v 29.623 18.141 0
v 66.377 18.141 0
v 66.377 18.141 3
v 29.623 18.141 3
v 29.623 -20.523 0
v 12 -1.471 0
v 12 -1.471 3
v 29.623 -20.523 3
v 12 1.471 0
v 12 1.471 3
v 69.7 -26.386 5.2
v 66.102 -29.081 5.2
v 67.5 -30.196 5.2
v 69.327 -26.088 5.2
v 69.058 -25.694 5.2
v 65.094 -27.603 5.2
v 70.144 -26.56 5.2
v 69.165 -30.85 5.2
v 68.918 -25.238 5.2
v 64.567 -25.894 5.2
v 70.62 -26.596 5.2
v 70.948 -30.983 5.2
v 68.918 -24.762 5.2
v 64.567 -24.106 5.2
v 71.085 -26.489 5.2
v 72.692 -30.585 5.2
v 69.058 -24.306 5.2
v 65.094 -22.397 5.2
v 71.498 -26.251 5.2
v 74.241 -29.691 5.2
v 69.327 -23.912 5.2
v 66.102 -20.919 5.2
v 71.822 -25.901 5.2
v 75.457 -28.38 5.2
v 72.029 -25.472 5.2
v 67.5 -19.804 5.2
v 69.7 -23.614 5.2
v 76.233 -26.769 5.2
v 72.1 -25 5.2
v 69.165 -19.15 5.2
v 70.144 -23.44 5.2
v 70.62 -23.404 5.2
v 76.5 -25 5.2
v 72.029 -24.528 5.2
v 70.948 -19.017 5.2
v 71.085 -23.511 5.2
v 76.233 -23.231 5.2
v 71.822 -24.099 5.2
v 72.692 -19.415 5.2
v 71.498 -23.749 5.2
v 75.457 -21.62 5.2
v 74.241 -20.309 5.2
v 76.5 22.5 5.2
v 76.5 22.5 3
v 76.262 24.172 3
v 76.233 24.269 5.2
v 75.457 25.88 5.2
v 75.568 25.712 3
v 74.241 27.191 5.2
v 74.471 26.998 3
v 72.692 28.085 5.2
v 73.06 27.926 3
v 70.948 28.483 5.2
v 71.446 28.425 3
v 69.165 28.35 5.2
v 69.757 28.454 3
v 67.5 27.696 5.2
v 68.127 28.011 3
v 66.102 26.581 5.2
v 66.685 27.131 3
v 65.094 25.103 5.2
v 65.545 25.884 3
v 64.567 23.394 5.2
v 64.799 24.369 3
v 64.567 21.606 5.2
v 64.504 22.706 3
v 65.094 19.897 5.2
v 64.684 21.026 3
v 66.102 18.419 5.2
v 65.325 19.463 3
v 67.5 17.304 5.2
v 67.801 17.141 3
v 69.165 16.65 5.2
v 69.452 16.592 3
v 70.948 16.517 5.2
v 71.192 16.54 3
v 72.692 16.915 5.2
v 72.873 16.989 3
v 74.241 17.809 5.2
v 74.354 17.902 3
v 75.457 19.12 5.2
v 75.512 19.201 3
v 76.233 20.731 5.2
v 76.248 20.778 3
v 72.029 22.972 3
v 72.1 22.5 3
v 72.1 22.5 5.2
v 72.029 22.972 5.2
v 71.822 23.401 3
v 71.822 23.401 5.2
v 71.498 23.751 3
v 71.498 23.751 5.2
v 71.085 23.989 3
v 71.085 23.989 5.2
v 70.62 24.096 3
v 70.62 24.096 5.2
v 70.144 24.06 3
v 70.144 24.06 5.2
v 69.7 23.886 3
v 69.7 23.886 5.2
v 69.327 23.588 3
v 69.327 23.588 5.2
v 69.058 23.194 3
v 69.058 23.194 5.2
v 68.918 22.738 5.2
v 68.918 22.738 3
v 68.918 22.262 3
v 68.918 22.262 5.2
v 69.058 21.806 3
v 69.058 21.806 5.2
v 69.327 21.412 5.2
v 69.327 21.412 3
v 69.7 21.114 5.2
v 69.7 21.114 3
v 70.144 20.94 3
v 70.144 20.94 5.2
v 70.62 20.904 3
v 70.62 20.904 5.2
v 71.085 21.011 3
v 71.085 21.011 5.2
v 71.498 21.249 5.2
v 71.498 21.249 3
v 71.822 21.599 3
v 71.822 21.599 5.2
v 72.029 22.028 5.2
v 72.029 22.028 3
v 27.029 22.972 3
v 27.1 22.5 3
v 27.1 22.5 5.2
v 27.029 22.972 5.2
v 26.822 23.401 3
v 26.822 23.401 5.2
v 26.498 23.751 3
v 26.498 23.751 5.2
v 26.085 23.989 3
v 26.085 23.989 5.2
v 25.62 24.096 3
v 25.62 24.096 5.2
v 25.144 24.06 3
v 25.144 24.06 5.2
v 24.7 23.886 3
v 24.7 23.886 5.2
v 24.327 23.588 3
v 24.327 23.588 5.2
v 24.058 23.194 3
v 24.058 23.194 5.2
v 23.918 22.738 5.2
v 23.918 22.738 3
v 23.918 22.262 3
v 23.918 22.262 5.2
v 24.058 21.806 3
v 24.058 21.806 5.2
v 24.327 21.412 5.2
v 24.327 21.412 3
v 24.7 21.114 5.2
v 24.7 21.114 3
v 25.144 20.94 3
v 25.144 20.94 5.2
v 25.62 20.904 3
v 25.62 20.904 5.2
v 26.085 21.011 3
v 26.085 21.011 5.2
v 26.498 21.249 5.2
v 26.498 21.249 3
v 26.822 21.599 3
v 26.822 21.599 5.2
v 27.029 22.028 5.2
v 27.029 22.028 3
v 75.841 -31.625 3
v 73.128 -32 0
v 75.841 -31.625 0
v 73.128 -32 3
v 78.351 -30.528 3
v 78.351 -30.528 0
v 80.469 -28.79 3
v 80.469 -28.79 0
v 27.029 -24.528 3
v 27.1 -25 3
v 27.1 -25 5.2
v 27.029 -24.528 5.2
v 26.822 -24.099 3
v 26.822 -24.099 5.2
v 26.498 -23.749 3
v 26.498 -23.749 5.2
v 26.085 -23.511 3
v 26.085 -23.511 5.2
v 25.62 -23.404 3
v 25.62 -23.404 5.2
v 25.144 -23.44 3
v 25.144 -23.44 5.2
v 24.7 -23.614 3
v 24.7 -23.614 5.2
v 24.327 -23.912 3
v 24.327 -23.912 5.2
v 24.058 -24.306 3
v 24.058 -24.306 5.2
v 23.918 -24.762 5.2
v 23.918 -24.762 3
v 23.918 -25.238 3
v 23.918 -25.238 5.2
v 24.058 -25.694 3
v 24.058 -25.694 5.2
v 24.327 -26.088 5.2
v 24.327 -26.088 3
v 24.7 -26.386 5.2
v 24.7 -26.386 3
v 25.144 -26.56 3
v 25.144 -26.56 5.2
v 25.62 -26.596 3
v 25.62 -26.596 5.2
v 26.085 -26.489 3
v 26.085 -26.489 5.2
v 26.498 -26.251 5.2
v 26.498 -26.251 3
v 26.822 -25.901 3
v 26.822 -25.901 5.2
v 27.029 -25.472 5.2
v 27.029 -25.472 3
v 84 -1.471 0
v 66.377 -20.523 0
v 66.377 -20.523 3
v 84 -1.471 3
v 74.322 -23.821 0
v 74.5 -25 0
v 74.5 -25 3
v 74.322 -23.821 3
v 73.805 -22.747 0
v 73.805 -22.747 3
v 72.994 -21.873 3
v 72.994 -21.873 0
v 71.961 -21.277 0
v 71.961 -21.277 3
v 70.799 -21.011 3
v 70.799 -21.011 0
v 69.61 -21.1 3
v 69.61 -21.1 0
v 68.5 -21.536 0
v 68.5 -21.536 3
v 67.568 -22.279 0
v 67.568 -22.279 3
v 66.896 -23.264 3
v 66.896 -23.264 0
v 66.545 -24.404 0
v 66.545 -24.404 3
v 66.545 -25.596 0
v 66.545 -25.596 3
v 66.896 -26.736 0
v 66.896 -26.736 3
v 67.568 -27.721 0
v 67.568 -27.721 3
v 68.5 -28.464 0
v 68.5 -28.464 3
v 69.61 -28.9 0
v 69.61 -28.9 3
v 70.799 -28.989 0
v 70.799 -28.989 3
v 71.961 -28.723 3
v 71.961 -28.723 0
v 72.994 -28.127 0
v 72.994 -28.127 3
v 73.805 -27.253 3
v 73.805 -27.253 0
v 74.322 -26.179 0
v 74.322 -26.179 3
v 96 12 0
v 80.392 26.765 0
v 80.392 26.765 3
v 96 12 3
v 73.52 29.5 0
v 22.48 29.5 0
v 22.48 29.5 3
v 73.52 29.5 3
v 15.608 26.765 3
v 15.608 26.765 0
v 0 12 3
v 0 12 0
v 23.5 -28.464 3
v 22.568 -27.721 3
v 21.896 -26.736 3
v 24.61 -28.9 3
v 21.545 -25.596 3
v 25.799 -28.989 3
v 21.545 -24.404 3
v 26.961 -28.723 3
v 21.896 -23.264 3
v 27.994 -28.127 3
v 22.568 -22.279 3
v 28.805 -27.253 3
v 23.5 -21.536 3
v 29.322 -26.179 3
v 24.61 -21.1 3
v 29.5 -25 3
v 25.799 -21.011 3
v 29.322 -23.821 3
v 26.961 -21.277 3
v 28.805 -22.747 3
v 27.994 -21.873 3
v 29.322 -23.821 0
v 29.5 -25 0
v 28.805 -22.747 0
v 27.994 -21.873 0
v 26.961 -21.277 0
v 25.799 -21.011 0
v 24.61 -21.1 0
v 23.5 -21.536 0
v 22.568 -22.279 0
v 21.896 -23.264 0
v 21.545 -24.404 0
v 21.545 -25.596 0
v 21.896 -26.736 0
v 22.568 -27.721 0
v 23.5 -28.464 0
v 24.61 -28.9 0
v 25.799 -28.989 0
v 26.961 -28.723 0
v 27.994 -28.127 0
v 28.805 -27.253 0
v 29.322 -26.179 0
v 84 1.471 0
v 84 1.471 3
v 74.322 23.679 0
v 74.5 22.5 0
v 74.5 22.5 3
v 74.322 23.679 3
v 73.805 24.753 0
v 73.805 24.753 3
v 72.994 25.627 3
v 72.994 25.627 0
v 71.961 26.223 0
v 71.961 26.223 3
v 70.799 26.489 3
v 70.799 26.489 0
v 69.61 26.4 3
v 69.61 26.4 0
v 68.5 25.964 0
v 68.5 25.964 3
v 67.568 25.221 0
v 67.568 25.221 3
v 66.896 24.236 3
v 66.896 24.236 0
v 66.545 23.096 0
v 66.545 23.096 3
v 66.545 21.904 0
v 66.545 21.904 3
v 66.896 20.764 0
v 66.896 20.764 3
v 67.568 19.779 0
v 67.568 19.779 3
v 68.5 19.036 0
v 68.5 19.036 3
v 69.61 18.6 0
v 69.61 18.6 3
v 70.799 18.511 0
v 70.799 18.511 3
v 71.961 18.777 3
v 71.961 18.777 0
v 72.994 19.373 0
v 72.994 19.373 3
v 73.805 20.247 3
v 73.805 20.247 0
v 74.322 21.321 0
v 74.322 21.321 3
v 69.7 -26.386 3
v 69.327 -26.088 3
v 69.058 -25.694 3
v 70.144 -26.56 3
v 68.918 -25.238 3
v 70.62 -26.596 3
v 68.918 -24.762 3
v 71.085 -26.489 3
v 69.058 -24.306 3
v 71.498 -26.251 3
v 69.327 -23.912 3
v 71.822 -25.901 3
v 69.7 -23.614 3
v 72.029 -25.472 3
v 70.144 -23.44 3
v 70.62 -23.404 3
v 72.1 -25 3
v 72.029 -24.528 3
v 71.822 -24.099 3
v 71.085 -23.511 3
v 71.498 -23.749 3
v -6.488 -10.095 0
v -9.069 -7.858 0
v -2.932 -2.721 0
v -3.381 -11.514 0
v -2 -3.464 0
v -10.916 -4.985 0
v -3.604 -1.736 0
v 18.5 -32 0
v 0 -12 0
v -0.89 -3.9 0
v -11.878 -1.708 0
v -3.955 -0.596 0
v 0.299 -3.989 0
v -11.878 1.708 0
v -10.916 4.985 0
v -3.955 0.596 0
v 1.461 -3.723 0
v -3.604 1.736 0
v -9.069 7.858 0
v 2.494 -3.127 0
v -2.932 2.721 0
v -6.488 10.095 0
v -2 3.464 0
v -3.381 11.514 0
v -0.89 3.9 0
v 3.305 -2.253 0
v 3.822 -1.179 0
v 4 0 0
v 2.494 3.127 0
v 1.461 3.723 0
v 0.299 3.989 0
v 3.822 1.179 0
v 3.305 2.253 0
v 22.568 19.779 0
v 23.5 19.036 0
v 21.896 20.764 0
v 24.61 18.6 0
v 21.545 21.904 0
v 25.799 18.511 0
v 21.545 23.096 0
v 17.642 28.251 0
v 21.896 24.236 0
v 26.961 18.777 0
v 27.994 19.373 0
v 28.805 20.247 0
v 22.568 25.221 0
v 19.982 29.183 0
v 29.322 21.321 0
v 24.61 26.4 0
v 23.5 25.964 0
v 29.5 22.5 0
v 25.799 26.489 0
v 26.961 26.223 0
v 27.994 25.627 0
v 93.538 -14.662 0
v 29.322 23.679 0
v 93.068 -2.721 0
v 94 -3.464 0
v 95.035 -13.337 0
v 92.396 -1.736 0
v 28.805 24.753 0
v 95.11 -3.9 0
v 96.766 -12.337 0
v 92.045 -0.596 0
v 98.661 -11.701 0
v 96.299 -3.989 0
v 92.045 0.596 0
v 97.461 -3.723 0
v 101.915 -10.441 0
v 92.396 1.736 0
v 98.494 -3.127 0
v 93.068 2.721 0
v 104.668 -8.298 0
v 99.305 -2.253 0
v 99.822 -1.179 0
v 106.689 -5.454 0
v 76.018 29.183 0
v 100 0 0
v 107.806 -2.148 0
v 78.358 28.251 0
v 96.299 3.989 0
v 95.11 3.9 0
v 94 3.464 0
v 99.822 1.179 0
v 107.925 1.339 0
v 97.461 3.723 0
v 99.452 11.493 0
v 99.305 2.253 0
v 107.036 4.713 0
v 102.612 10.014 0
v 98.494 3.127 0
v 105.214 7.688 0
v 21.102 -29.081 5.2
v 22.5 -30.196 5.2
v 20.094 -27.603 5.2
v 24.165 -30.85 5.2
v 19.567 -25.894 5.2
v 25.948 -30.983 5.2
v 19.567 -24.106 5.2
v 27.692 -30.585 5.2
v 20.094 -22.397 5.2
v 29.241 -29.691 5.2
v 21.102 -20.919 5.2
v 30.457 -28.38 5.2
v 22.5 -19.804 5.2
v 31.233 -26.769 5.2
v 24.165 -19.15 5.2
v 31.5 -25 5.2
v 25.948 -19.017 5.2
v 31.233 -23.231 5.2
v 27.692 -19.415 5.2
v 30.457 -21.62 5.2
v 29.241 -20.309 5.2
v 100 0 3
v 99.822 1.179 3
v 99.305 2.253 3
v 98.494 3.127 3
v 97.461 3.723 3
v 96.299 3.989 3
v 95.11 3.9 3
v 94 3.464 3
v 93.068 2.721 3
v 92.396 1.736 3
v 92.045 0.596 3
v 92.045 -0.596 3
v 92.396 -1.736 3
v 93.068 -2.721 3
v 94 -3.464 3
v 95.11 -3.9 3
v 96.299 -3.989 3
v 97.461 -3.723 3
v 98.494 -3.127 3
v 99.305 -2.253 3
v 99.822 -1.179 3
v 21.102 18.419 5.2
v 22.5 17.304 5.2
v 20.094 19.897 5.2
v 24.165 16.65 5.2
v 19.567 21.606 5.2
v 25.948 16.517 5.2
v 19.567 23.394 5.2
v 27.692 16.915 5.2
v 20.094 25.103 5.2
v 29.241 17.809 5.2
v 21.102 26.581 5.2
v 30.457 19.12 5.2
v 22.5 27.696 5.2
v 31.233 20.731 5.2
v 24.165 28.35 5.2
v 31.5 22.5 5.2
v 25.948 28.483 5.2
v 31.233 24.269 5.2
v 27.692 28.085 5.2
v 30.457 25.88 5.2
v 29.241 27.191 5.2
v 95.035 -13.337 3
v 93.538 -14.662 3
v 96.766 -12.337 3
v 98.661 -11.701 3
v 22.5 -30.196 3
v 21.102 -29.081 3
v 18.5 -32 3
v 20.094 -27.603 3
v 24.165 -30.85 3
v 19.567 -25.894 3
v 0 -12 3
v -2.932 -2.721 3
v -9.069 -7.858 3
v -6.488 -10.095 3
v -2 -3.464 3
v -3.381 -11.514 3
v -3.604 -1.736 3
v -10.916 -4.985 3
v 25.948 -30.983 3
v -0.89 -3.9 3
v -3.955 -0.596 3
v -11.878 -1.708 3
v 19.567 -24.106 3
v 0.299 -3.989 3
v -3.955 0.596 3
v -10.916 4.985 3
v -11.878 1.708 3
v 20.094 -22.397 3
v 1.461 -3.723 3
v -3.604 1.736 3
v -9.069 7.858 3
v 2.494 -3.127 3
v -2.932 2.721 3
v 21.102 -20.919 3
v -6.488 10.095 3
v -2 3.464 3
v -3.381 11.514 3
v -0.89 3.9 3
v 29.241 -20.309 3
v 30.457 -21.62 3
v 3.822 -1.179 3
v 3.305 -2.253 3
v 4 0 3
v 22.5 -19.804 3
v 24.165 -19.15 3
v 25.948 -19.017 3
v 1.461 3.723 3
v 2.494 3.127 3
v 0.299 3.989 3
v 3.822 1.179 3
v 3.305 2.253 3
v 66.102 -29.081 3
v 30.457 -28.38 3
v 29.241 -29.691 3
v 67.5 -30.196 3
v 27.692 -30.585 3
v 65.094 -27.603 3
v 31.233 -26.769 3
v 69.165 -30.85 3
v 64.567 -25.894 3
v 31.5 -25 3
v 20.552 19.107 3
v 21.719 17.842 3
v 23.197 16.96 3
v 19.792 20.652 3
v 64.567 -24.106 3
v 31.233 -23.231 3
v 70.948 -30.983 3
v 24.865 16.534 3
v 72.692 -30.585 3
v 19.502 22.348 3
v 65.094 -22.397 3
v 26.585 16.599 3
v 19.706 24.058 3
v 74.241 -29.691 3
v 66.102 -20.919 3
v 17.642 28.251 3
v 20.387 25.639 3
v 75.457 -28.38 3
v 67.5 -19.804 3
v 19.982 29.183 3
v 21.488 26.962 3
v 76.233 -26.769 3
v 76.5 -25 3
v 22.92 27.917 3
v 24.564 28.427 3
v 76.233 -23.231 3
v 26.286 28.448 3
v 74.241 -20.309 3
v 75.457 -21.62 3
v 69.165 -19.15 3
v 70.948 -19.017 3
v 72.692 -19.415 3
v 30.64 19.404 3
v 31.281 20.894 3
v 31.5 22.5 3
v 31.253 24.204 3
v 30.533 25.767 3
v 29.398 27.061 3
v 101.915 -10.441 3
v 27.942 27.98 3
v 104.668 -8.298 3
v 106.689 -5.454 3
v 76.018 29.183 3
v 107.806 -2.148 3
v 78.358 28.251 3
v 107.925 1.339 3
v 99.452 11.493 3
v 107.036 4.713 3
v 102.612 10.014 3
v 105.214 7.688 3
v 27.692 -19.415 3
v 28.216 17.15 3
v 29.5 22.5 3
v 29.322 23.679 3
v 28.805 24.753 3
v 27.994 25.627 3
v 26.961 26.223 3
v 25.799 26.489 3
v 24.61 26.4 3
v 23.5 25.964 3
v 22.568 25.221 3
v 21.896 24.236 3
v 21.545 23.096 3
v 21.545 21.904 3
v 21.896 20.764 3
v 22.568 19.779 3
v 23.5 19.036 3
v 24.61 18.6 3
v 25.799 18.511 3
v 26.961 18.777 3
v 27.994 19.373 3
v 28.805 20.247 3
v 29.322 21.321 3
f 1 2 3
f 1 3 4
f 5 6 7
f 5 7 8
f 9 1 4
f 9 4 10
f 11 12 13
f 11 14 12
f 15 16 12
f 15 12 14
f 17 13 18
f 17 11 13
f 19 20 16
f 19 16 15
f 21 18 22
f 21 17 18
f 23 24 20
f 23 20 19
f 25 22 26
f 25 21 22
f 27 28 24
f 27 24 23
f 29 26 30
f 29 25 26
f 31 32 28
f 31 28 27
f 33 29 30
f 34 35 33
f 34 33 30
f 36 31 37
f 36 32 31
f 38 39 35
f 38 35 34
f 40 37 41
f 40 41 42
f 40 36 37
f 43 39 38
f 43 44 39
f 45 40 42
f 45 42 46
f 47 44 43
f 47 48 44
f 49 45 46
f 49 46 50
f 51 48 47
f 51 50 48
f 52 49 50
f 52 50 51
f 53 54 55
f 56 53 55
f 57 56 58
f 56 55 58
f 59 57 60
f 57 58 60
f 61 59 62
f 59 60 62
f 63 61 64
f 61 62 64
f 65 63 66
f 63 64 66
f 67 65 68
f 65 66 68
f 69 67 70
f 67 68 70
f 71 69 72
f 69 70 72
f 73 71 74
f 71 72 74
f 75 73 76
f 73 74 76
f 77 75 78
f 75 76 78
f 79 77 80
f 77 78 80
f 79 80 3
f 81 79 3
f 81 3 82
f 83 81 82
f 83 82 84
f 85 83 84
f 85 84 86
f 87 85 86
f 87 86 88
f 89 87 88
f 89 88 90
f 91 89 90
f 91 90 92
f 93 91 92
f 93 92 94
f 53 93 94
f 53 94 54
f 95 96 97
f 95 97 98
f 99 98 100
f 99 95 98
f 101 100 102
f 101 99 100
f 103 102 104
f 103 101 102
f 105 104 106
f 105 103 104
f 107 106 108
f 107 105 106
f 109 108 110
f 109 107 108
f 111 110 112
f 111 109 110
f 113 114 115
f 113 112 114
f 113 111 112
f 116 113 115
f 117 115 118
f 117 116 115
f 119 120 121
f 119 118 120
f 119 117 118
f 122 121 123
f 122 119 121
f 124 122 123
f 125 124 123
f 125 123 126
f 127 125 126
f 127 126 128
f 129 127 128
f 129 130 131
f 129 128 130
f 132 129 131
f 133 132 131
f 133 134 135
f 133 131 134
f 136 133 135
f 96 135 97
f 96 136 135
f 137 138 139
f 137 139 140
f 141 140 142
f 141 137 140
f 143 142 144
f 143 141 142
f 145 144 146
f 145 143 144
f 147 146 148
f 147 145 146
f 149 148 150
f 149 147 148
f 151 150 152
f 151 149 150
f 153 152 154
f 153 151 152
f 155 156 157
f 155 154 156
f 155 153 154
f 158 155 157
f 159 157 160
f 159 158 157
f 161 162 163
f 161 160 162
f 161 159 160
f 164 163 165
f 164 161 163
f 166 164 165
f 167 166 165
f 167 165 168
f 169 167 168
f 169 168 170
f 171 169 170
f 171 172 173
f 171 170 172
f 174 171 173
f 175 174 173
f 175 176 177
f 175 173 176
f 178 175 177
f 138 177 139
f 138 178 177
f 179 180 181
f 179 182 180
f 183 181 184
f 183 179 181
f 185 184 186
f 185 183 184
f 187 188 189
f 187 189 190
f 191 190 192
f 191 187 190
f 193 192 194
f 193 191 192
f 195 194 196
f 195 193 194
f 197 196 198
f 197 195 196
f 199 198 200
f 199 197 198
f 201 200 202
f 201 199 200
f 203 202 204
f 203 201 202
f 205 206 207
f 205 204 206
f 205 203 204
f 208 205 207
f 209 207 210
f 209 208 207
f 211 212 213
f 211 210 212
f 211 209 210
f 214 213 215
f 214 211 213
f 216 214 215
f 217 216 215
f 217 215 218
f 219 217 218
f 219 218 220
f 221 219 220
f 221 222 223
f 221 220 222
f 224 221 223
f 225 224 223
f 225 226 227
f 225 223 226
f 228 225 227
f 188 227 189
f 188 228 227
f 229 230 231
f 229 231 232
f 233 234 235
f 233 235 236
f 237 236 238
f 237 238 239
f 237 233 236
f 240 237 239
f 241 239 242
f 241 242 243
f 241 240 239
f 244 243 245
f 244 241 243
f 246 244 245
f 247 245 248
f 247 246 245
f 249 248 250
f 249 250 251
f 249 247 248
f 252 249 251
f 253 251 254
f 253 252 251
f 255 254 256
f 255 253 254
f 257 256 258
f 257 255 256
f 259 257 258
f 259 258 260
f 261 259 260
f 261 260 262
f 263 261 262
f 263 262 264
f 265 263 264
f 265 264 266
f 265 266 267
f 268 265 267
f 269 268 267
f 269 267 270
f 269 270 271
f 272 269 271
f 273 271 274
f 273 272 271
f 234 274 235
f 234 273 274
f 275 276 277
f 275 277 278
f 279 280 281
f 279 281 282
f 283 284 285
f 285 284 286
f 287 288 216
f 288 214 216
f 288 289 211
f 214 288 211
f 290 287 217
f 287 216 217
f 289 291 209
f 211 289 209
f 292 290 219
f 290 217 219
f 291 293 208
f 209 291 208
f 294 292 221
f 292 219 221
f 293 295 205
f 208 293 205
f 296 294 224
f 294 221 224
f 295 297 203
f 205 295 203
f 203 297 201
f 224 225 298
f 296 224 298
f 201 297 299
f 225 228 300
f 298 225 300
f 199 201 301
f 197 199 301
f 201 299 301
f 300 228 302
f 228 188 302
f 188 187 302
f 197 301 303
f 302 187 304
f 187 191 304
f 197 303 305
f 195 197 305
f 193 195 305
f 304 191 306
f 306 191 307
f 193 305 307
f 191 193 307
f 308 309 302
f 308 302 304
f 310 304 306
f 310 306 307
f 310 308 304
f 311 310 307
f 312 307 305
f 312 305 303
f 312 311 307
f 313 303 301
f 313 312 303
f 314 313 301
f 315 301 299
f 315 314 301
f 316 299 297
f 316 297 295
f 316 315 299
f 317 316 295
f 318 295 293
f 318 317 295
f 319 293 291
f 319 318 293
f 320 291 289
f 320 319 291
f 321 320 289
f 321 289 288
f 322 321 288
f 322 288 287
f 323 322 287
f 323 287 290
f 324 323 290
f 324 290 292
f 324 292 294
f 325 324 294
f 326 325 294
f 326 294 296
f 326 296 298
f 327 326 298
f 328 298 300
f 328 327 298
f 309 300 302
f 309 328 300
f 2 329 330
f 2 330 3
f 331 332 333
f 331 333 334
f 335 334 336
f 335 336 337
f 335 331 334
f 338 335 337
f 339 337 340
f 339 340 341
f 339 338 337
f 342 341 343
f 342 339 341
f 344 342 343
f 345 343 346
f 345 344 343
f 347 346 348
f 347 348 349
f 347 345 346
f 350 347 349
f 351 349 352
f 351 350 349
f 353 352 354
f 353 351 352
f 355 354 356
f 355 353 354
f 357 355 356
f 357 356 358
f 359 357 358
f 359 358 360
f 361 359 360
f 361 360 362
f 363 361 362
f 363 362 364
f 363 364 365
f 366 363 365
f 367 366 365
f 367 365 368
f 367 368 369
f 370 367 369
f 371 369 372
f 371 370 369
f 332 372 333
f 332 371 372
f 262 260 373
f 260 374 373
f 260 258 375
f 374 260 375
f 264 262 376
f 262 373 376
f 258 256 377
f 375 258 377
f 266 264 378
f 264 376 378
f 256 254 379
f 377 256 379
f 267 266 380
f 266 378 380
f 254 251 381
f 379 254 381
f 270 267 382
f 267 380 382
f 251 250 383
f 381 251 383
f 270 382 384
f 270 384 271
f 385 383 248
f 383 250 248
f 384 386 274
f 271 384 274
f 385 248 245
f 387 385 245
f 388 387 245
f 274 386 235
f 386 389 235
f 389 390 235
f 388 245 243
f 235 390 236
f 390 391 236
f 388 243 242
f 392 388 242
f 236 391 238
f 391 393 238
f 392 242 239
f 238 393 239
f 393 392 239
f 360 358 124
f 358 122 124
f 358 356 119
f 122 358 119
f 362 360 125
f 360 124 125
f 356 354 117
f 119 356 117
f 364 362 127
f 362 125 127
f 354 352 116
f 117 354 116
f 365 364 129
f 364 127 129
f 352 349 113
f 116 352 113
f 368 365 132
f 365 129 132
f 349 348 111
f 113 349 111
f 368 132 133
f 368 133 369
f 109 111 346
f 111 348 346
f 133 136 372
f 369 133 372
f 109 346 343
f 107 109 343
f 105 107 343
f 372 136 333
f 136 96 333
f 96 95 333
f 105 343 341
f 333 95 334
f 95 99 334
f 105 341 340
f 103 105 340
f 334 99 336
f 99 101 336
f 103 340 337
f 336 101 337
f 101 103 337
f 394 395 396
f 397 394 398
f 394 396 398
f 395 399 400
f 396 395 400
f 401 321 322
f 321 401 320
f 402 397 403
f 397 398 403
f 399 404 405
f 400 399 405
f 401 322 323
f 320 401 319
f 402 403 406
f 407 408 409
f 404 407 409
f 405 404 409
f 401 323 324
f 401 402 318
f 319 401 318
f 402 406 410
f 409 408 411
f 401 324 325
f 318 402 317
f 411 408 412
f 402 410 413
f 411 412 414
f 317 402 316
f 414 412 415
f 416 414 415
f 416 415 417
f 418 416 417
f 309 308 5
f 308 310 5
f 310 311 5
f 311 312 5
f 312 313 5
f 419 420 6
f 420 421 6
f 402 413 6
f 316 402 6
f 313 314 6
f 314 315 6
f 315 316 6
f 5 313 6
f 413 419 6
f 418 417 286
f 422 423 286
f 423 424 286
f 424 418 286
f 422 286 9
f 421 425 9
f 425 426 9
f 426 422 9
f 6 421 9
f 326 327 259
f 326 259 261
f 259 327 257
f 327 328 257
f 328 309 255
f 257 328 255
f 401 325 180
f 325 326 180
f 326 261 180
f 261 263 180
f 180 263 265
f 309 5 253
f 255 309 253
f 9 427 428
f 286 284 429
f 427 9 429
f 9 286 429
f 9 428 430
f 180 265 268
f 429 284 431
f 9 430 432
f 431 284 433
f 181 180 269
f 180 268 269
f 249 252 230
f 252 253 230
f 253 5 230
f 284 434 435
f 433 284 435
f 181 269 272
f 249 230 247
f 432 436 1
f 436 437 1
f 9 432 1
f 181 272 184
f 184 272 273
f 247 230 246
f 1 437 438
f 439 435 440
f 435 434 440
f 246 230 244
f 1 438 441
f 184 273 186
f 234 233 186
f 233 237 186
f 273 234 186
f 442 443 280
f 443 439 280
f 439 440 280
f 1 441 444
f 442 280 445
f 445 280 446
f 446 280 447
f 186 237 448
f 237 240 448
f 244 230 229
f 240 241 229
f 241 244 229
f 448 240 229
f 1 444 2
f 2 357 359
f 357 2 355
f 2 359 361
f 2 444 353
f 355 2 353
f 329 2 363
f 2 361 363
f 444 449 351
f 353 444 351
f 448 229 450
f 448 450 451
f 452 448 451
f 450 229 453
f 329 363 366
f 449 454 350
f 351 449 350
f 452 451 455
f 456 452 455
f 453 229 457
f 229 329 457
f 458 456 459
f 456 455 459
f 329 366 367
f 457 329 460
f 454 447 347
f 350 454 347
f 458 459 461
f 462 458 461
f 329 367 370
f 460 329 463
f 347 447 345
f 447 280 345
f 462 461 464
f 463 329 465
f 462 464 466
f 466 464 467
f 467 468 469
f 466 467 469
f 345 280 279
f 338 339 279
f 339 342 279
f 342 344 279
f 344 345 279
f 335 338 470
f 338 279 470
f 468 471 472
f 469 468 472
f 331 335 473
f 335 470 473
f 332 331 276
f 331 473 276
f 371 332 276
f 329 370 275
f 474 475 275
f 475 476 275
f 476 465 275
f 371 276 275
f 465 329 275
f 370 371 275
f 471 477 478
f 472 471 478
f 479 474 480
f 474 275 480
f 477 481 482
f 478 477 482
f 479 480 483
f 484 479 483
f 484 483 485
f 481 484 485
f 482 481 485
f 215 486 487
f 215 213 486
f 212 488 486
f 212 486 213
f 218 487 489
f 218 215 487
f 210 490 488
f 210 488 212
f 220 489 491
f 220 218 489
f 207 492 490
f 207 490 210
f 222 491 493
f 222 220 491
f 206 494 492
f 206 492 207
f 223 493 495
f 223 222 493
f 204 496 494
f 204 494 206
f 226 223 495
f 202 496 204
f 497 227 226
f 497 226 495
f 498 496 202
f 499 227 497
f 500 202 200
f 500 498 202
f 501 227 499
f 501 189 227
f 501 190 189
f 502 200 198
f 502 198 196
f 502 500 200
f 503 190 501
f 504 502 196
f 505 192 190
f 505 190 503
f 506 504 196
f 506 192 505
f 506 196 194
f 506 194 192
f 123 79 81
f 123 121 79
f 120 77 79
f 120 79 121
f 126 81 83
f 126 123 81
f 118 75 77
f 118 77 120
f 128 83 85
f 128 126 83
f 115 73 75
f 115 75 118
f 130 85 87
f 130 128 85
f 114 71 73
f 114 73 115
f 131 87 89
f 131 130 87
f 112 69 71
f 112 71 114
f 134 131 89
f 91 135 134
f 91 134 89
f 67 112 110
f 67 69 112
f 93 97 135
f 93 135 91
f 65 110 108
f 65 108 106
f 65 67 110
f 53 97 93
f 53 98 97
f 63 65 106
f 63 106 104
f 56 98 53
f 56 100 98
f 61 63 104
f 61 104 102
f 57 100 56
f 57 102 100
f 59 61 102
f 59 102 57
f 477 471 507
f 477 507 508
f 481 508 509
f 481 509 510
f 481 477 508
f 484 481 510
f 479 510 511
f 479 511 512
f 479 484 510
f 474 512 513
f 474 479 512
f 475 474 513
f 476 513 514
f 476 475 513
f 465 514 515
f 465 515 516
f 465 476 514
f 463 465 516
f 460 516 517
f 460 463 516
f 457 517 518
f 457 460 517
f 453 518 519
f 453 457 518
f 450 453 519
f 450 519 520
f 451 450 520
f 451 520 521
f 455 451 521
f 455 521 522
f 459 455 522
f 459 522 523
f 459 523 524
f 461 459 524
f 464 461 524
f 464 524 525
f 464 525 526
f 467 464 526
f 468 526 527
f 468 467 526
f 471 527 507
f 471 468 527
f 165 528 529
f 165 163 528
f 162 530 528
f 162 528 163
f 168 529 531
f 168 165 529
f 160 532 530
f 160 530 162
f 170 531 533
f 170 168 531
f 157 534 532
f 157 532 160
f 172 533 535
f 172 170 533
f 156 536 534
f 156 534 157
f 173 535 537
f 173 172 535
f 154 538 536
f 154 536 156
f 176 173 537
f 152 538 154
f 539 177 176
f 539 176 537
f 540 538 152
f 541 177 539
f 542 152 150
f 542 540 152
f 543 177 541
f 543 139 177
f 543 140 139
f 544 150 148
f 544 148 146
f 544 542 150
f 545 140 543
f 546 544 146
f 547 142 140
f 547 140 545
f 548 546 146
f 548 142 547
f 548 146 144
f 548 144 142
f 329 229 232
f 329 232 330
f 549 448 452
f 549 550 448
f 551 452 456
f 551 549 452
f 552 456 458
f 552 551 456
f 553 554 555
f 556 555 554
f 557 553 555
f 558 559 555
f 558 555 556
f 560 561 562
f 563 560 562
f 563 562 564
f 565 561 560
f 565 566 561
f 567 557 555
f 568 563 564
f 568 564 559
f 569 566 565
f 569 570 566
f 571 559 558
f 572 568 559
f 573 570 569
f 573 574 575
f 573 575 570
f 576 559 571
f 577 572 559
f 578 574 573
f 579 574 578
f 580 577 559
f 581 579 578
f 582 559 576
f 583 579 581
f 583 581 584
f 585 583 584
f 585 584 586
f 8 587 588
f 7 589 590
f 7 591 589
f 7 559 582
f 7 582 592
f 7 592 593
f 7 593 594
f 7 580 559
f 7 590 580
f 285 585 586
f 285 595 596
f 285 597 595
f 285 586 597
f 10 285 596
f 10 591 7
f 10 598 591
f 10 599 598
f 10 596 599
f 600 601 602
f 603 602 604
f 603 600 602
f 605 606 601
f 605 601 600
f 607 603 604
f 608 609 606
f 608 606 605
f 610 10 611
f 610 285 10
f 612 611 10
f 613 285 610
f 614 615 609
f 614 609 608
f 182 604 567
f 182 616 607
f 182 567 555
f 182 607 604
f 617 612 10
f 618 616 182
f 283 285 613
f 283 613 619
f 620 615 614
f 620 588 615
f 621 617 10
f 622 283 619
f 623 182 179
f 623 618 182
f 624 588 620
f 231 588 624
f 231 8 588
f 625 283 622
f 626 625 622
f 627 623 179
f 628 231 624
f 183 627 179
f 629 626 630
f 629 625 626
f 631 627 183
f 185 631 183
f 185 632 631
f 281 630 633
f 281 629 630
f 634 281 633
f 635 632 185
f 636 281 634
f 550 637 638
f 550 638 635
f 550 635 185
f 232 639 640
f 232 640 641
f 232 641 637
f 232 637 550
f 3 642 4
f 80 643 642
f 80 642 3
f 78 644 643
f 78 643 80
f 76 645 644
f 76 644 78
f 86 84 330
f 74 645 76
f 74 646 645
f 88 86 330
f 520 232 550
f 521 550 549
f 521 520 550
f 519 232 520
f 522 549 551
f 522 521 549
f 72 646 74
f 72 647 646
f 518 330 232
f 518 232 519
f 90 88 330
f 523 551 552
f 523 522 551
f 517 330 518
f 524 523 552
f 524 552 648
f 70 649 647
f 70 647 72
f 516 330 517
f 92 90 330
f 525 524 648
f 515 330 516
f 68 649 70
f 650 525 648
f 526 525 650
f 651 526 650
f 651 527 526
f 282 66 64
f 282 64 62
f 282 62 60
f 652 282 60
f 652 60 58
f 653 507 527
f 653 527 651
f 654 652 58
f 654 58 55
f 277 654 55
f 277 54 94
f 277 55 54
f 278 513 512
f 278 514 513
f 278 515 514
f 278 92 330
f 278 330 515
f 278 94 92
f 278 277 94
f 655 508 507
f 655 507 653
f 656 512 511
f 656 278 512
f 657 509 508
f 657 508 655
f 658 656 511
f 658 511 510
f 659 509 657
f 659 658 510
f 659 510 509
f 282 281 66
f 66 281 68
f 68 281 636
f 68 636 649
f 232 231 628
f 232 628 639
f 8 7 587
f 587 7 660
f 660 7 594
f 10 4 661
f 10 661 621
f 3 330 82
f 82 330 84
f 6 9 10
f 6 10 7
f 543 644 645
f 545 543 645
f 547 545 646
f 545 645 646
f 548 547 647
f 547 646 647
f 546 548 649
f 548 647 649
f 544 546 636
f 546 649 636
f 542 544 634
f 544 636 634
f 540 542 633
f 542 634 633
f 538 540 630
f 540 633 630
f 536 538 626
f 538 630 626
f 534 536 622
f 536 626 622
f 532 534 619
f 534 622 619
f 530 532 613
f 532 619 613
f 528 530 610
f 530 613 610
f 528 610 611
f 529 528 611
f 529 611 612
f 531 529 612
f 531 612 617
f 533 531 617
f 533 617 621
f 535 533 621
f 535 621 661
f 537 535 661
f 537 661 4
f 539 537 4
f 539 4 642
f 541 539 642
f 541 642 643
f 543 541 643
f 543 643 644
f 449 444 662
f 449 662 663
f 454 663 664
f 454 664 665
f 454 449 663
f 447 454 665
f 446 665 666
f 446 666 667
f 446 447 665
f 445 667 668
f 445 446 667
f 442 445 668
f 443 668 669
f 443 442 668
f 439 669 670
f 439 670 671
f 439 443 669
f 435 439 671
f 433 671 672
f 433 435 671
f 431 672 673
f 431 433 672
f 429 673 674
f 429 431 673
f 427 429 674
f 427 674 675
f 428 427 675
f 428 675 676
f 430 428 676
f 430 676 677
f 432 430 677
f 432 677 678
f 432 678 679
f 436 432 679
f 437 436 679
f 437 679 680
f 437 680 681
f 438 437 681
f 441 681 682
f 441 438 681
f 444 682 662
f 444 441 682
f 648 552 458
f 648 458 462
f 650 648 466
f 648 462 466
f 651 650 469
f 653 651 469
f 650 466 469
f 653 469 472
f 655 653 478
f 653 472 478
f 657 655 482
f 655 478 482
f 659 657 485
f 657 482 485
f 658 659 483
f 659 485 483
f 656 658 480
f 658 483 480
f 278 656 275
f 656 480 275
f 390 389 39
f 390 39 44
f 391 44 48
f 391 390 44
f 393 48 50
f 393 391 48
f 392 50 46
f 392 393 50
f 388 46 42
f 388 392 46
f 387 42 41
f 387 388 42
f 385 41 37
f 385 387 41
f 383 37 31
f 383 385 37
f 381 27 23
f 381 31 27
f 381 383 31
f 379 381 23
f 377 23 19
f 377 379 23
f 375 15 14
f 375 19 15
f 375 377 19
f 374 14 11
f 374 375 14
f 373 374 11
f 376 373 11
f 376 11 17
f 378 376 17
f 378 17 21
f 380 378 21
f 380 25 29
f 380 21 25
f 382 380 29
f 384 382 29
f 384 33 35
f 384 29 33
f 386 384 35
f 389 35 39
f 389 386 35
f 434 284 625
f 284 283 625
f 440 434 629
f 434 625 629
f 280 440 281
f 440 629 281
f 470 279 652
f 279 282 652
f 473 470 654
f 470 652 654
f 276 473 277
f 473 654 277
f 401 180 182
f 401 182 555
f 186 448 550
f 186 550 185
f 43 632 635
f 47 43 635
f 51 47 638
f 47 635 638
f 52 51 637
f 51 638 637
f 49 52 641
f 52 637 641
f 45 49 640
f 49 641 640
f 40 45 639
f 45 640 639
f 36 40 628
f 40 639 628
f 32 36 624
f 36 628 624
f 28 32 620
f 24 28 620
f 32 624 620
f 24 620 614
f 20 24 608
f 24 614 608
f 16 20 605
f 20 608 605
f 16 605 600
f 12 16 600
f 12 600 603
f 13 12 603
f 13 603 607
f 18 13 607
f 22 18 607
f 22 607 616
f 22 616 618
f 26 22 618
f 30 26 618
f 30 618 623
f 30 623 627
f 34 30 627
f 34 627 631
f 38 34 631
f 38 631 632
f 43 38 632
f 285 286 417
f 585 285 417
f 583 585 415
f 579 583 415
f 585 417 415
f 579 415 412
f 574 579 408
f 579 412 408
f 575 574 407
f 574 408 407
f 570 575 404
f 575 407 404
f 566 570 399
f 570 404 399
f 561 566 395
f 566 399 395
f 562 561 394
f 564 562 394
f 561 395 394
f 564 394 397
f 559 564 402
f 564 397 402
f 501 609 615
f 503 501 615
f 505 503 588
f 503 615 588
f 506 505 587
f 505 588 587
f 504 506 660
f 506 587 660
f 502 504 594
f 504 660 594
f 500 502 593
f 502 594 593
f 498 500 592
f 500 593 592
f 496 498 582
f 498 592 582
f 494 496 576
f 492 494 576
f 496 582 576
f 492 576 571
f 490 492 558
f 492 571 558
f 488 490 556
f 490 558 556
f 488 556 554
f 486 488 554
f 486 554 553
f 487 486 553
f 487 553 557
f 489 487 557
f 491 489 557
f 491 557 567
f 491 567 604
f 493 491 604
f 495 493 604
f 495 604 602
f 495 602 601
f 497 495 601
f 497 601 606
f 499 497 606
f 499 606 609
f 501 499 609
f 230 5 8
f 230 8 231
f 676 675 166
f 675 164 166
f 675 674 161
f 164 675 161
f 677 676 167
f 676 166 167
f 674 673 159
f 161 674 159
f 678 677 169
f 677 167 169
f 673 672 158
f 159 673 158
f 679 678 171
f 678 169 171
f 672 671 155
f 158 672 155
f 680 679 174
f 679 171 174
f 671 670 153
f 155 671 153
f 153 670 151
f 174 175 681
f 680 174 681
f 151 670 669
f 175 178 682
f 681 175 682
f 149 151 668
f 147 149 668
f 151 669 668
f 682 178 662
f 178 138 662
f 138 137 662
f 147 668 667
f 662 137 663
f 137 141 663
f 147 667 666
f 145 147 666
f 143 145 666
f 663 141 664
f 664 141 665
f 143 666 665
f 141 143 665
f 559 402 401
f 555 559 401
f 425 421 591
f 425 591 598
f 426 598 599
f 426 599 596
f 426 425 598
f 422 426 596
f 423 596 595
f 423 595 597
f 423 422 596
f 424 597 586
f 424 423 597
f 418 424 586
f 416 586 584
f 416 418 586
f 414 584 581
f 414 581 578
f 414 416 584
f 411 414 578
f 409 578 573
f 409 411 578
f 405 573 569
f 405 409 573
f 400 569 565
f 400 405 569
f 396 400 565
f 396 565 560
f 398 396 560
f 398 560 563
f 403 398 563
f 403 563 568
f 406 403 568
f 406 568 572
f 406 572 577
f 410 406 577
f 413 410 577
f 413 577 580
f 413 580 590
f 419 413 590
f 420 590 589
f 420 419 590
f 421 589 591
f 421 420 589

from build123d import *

# Parameters (mm, degrees)
SKETCH_R        = 4
PAD_DEPTH       = 3
SKETCH002_R     = 6
PAD001_DEPTH    = 3
SKETCH001_R     = 4
POCKET_DEPTH    = 3
SKETCH003_R     = 1.6
POCKET001_DEPTH = 5.201
FILLET_R        = 10
FILLET001_R     = 10


with BuildPart() as part:
    # Sketch → Pad (new body)
    with BuildSketch(Plane.XY):
        with BuildLine():
            ThreePointArc((0, 12), (-12, 0), (0, -12))
            Line((0, -12), (18.5, -32))
            Line((77.5, -32), (18.5, -32))
            Line((96, -12), (77.5, -32))
            ThreePointArc((96, -12), (108, 0), (96, 12))
            Line((77.5, 29.5), (96, 12))
            Line((18.5, 29.5), (77.5, 29.5))
            Line((18.5, 29.5), (0, 12))
        make_face()
        Circle(SKETCH_R, mode=Mode.SUBTRACT)
        with Locations((96, 0)):
            Circle(SKETCH_R, mode=Mode.SUBTRACT)
        Polygon((66.376801, -20.522703), (84, -1.470596), (84, 1.470596), (66.376801, 18.141189), (29.623199, 18.141189), (12, 1.470596), (12, -1.470596), (29.623199, -20.522703), align=None, mode=Mode.SUBTRACT)
    extrude(amount=PAD_DEPTH)

    # Sketch002 → Pad001 (join)
    with BuildSketch(Plane.XY.offset(2.2)):
        with Locations((25.5, -25)):
            Circle(SKETCH002_R)
        with Locations((70.5, -25)):
            Circle(SKETCH002_R)
        with Locations((25.5, 22.5)):
            Circle(SKETCH002_R)
        with Locations((70.5, 22.5)):
            Circle(SKETCH002_R)
    extrude(amount=PAD001_DEPTH)

    # Sketch001 → Pocket (cut)
    with BuildSketch(Plane.XY):
        with Locations((25.5, -25)):
            Circle(SKETCH001_R)
        with Locations((70.5, -25)):
            Circle(SKETCH001_R)
        with Locations((25.5, 22.5)):
            Circle(SKETCH001_R)
        with Locations((70.5, 22.5)):
            Circle(SKETCH001_R)
    extrude(amount=POCKET_DEPTH, mode=Mode.SUBTRACT)

    # Sketch003 → Pocket001 (cut, through all)
    with BuildSketch(Plane.XY):
        with Locations((25.5, -25)):
            Circle(SKETCH003_R)
        with Locations((70.5, -25)):
            Circle(SKETCH003_R)
        with Locations((25.5, 22.5)):
            Circle(SKETCH003_R)
        with Locations((70.5, 22.5)):
            Circle(SKETCH003_R)
    extrude(amount=POCKET001_DEPTH, mode=Mode.SUBTRACT)

    # Fillet
    fillet_edges = [part.edges().sort_by_distance(p)[0] for p in [
        (77.5, 29.5, 1.5),
        (18.5, 29.5, 1.5),
    ]]
    fillet(fillet_edges, radius=FILLET_R)

    # Fillet001
    fillet001_edges = [part.edges().sort_by_distance(p)[0] for p in [
        (77.5, -32, 1.5),
        (96, -12, 1.5),
    ]]
    fillet(fillet001_edges, radius=FILLET001_R)


solid = part.part
